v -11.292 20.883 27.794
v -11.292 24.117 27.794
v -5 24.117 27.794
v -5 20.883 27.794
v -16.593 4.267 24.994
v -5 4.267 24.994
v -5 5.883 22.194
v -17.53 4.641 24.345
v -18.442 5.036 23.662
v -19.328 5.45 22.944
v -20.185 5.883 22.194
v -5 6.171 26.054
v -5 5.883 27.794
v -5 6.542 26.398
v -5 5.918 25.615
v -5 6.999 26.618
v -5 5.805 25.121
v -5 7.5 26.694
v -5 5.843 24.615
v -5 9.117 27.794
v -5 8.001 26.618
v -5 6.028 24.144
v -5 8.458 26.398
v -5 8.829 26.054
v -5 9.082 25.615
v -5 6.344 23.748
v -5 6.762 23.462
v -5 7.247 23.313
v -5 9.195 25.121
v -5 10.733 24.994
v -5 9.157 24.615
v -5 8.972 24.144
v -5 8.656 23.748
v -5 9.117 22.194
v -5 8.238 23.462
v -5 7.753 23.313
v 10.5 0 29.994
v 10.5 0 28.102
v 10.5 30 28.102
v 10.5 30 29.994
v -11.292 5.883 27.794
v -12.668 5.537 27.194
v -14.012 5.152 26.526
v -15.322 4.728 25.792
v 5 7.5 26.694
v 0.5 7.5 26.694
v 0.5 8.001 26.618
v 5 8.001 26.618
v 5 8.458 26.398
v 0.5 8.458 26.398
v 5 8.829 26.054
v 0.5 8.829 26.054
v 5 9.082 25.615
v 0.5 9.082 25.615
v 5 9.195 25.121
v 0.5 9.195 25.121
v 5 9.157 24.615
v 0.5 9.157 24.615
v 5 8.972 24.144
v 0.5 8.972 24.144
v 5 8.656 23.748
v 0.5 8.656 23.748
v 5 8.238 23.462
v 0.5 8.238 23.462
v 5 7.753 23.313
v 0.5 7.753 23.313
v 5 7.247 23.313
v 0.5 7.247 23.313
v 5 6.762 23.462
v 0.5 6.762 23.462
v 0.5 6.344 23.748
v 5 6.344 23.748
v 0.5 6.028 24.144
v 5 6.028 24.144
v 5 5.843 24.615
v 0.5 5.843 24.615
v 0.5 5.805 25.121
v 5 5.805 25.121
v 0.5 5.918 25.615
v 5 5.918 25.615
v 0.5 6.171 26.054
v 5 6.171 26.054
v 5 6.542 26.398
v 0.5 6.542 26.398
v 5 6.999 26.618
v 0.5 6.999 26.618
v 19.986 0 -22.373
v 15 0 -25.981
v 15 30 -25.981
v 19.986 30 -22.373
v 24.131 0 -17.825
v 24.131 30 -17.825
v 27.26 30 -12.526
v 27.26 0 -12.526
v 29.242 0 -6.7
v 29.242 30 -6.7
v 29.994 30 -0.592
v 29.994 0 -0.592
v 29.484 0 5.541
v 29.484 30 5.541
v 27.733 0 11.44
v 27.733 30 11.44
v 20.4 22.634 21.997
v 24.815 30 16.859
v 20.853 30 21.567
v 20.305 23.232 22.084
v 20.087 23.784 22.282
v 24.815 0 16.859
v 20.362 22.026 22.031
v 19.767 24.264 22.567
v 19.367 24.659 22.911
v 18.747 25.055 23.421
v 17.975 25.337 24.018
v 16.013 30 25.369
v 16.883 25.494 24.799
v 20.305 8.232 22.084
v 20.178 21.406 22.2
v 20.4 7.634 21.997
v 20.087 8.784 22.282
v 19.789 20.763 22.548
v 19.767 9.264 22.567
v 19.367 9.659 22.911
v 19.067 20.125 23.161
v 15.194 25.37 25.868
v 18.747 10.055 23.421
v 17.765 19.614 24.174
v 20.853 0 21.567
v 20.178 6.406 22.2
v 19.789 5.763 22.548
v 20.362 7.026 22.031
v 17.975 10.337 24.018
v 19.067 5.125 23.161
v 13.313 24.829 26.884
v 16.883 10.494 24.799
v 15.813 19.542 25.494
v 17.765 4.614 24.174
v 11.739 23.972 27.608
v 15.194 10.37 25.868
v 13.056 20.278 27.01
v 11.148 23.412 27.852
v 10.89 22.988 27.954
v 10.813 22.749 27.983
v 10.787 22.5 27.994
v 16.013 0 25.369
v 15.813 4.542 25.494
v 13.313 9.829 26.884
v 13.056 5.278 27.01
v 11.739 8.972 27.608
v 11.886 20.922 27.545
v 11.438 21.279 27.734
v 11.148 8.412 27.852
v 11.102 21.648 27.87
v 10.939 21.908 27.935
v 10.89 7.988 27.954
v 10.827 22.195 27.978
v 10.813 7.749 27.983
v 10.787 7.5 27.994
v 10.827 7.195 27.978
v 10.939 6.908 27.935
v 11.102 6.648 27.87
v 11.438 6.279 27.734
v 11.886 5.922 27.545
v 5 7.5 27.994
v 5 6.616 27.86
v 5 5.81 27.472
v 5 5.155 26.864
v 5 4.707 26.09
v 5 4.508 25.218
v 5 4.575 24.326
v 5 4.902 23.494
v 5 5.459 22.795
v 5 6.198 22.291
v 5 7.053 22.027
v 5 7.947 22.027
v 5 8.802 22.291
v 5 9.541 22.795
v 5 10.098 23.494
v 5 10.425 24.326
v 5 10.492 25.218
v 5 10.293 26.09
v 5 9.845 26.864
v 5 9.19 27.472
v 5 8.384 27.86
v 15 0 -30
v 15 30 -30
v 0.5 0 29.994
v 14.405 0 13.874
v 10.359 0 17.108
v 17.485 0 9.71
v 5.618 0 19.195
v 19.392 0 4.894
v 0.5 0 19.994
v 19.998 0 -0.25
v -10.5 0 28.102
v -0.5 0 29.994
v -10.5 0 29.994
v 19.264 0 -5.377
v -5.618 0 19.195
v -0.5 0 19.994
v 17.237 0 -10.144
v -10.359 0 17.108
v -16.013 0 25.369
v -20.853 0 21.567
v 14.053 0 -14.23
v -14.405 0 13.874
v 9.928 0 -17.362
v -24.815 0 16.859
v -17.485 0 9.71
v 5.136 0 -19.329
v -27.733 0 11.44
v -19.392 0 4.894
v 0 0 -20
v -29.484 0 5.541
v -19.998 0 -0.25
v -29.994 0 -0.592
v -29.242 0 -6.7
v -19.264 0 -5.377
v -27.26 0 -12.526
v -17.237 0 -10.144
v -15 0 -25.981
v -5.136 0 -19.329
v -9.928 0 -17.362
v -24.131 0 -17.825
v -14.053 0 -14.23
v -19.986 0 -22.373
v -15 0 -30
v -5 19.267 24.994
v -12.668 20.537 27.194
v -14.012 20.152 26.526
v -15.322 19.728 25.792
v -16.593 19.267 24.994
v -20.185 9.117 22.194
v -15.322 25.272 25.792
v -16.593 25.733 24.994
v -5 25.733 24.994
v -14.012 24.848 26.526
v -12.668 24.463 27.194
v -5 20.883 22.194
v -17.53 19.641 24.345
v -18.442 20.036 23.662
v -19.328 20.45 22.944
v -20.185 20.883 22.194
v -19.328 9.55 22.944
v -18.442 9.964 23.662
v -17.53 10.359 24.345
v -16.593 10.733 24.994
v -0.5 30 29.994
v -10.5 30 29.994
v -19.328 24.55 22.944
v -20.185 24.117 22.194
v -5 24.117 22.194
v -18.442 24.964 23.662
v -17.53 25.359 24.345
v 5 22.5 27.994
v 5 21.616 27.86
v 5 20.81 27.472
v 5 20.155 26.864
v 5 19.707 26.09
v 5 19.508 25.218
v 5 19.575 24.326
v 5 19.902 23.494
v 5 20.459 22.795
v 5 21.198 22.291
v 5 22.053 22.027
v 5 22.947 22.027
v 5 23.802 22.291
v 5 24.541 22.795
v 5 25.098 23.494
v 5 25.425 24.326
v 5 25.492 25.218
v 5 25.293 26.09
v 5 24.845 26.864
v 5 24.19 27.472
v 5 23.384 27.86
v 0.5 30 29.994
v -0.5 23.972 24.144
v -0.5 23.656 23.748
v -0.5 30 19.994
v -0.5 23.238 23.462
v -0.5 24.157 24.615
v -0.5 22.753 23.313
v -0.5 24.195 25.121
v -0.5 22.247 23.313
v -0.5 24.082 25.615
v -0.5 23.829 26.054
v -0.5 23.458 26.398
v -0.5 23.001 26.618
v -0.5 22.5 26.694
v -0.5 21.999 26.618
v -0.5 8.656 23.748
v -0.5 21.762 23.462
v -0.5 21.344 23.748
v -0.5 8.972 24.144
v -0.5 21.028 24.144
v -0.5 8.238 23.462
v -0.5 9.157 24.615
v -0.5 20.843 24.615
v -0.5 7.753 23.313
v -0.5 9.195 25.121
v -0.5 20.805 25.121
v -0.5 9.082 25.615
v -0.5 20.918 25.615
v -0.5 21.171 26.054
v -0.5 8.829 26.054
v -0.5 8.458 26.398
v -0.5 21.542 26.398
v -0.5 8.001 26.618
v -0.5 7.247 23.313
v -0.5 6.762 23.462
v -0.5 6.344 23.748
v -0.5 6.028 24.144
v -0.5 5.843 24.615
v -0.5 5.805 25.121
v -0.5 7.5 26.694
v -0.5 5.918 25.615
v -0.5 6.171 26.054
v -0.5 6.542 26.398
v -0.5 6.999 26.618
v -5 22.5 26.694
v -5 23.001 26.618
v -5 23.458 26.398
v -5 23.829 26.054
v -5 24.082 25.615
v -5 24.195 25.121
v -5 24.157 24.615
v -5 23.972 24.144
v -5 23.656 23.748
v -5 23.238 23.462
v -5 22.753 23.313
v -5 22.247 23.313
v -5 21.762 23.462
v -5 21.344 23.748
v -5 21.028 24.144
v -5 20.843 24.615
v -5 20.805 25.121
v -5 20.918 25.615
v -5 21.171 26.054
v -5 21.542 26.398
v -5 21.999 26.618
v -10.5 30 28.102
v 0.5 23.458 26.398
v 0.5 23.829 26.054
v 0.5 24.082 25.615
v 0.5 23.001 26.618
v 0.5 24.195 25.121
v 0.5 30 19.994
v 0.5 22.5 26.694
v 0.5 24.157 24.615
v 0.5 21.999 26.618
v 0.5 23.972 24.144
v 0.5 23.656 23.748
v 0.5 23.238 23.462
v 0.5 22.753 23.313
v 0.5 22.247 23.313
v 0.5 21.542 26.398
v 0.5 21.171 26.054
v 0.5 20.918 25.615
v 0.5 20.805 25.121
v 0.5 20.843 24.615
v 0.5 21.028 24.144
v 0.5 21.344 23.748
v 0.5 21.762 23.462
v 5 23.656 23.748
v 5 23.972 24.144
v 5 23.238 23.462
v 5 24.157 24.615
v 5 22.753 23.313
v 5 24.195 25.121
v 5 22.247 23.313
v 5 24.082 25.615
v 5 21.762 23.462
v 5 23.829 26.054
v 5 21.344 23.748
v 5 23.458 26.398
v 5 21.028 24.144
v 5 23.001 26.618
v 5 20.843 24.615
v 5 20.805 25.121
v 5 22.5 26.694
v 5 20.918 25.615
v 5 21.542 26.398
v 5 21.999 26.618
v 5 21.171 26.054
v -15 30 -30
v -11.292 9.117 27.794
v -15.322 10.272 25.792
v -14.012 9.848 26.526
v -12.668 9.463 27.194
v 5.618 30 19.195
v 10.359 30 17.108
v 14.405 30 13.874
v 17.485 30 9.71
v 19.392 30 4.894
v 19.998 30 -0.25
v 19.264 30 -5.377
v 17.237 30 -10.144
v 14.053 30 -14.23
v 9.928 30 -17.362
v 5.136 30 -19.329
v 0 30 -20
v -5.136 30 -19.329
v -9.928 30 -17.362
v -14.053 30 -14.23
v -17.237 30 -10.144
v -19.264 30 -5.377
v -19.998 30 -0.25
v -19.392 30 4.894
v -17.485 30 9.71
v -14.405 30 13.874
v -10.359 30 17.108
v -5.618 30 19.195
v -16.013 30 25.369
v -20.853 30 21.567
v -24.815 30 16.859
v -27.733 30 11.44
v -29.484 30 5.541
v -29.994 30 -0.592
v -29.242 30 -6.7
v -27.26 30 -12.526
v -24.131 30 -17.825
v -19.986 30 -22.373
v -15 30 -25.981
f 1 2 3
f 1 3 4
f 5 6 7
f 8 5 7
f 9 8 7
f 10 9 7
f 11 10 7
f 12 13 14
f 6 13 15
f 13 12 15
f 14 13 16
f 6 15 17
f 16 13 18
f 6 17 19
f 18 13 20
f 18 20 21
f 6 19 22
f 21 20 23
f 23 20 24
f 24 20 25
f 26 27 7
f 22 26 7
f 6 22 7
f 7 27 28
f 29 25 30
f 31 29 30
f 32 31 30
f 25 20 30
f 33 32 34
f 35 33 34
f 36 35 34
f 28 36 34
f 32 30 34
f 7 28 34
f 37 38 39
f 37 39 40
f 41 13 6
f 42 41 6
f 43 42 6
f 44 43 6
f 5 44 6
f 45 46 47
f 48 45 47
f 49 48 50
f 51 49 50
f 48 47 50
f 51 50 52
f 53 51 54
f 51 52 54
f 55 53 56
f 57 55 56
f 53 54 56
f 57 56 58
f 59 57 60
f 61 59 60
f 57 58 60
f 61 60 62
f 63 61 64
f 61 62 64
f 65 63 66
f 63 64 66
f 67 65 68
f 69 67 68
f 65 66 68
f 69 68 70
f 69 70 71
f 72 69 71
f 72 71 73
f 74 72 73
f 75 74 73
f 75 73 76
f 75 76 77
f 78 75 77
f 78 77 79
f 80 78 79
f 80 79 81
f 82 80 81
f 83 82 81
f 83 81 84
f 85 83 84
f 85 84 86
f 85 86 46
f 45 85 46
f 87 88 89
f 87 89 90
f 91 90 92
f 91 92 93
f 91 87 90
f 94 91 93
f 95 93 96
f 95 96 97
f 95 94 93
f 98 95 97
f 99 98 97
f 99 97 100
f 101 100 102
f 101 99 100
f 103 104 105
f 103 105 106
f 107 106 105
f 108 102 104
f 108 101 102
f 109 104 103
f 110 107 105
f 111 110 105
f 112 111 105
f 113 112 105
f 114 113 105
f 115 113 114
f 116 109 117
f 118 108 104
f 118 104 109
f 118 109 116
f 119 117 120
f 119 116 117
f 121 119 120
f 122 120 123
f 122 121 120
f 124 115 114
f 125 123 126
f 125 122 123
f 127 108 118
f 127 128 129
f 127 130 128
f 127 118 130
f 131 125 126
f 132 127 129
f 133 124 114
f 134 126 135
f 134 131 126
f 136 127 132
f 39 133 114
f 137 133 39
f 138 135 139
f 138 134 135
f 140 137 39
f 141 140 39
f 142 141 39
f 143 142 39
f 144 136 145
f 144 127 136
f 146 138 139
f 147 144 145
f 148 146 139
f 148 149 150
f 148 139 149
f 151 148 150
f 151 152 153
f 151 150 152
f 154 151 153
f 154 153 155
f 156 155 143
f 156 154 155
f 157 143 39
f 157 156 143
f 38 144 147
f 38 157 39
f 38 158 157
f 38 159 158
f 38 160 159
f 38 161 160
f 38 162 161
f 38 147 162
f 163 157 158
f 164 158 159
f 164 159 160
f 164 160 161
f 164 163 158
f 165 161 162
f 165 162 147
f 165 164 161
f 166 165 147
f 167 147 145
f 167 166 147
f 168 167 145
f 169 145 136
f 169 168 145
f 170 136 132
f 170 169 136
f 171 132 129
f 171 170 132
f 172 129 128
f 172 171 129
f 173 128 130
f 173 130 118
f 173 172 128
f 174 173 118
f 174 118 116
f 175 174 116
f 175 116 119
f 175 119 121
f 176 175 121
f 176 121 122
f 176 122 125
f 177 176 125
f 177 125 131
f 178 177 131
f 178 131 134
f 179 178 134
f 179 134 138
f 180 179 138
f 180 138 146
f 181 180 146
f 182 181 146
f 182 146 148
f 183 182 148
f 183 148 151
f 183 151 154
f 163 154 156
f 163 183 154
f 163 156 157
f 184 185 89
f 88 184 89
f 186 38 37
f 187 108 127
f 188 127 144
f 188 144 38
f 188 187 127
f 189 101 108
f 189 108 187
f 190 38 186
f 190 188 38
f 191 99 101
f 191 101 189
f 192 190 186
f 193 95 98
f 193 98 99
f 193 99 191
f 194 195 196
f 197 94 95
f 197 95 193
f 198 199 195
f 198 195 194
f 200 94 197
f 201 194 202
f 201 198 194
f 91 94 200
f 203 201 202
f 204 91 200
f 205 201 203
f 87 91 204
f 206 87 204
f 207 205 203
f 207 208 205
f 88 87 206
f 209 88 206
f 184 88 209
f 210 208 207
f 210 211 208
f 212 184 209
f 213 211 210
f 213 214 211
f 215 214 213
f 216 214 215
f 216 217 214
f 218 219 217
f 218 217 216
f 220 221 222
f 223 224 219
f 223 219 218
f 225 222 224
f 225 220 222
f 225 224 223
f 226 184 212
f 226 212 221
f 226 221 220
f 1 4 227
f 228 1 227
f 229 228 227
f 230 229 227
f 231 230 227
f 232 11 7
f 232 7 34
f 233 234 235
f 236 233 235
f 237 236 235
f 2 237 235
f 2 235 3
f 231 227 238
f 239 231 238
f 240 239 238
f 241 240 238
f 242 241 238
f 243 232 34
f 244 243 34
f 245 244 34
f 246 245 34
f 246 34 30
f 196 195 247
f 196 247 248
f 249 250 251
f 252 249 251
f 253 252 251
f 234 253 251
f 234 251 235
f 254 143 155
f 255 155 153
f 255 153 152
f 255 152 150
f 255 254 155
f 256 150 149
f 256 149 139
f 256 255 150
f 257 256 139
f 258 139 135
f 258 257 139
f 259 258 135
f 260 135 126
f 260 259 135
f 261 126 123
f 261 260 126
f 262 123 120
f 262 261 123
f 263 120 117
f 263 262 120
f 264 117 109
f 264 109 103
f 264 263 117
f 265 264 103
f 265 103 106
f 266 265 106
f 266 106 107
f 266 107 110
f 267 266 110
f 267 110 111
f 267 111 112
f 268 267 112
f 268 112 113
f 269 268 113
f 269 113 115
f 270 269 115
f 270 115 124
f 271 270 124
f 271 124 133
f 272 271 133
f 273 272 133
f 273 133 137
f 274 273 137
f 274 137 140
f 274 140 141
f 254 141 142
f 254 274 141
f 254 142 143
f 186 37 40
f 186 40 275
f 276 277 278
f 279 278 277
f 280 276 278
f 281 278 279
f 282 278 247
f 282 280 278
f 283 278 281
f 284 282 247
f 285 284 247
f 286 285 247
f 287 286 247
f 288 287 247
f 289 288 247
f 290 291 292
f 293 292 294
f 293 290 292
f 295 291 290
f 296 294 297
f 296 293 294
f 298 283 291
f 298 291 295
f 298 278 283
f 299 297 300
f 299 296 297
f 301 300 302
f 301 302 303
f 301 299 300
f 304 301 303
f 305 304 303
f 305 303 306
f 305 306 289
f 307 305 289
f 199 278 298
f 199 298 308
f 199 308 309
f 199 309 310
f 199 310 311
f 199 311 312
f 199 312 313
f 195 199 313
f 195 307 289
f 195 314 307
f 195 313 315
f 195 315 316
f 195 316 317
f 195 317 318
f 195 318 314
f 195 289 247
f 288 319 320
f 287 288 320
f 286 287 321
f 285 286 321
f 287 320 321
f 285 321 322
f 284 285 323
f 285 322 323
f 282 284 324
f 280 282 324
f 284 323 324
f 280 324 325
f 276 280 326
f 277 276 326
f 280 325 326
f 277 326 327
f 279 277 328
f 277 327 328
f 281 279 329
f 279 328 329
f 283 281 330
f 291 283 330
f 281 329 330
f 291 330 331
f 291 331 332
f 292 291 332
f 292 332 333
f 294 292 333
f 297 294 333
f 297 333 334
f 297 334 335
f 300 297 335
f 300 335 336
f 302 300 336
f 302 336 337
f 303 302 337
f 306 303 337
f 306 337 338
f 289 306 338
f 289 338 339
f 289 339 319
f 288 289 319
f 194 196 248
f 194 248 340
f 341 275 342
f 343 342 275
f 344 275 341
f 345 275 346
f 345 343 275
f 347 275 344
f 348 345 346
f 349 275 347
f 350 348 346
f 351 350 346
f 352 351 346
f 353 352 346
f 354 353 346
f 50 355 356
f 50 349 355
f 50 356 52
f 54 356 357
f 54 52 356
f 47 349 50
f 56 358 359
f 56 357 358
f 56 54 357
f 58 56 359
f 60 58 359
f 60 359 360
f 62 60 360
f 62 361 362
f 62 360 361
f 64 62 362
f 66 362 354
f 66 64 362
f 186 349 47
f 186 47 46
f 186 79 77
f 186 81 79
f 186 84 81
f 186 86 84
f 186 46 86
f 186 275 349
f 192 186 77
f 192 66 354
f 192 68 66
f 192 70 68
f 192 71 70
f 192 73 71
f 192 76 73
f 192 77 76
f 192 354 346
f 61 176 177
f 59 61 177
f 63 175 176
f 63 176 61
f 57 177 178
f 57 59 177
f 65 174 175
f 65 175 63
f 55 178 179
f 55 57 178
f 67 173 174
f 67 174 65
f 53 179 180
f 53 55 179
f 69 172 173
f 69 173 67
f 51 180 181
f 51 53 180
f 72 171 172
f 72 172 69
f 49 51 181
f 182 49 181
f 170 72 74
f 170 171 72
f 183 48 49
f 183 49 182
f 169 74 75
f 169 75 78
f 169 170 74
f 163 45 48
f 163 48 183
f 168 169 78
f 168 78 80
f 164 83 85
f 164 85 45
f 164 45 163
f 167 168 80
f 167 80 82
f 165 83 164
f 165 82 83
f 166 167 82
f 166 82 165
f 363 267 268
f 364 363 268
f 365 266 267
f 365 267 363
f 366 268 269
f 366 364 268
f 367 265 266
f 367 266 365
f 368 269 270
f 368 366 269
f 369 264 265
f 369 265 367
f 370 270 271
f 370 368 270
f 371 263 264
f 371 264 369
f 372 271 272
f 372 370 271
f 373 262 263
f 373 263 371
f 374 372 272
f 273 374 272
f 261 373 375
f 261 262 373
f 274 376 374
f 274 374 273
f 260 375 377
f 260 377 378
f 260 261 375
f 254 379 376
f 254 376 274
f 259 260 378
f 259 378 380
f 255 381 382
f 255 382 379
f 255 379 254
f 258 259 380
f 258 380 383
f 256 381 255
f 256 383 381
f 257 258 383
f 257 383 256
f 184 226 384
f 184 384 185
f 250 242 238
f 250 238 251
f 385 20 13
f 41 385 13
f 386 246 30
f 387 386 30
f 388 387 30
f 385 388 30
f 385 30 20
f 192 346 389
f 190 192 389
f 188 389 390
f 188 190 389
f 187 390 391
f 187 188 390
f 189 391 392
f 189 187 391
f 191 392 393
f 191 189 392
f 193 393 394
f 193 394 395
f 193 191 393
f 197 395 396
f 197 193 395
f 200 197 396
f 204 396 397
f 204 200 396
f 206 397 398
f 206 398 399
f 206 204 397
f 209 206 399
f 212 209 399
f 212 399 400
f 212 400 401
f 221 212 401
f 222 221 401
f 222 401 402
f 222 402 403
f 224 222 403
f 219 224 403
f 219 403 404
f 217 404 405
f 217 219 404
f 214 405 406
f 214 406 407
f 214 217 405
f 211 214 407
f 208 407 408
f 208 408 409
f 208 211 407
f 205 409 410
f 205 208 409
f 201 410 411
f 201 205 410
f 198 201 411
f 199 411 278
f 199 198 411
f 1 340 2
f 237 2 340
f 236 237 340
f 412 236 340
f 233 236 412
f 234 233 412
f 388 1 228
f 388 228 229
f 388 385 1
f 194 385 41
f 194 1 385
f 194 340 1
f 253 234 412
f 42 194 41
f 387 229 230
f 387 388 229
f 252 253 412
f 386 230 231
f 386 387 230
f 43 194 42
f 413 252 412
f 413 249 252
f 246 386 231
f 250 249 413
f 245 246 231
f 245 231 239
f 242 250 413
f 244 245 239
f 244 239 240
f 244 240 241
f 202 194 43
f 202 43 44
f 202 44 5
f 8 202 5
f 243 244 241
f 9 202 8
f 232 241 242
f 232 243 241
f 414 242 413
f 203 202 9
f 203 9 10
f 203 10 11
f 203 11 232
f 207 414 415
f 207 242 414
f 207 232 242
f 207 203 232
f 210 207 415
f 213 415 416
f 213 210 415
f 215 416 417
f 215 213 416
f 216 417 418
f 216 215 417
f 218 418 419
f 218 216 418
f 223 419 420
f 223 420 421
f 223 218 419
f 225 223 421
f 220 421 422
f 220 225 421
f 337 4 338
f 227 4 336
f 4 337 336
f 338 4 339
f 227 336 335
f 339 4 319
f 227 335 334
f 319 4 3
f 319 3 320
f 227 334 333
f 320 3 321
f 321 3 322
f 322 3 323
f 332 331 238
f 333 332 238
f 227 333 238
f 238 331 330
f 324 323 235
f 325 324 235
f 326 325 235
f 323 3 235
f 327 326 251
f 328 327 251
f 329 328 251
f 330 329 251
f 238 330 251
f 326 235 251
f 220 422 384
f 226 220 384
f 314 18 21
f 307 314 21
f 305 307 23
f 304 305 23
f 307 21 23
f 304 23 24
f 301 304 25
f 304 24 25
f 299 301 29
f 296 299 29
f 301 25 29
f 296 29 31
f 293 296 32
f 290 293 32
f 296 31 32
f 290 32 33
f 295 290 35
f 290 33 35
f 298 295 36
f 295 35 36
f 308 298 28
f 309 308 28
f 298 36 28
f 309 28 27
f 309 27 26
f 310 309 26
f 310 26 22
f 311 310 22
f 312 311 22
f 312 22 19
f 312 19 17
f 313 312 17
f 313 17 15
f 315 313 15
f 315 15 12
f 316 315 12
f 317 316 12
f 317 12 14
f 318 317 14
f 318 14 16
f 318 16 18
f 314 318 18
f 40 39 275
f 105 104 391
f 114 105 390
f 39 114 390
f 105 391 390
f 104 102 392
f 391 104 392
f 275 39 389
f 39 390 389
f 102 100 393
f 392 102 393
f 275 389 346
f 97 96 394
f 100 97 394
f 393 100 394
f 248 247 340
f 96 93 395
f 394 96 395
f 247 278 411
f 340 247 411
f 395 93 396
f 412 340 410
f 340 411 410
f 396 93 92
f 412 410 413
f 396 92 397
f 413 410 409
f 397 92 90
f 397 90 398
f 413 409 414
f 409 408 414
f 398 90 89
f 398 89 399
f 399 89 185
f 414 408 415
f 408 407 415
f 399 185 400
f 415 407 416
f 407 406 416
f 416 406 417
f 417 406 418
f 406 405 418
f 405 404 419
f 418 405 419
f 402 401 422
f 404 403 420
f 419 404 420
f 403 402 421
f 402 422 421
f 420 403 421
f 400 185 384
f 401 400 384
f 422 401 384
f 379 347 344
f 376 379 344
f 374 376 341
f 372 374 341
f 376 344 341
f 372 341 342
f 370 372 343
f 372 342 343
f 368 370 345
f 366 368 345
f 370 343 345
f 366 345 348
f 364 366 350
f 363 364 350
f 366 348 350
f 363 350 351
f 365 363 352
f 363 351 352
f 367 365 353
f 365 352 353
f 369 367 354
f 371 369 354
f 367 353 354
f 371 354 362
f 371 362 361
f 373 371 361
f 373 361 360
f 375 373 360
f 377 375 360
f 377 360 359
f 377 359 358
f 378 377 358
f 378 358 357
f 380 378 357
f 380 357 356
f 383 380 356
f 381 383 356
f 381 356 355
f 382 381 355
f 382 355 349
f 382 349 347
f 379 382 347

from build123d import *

# Parameters (mm, degrees)
BOSS_EXTRUDE1_DEPTH     = 30
CUT_EXTRUDE1_REACH      = 57
CUT_EXTRUDE1_END_RADIUS = 30
SKETCH7_R               = 3
CUT_EXTRUDE2_REACH      = 57
CUT_EXTRUDE2_END_RADIUS = 30
M3_CLEARANCE_HOLE1_D    = 3.4


with BuildPart() as part:
    # Sketch1 → Boss-Extrude1 (new body)
    with BuildSketch(Plane(origin=(0, 0, 0), x_dir=(1, 0, 0), z_dir=(0, 1, 0))):
        with BuildLine():
            Line((-0.5, -19.993749023), (-0.5, -29.993749023))
            Line((-0.5, -29.993749023), (-10.5, -29.993749023))
            Line((-10.5, -29.993749023), (-10.5, -28.102490993))
            ThreePointArc((-10.5, -28.102490993), (-29.896689894, -2.4875557), (-15, 25.980762114))
            Line((-15, 25.980762114), (-15, 30))
            Line((-15, 30), (15, 30))
            Line((15, 30), (15, 25.980762114))
            ThreePointArc((15, 25.980762114), (29.896689894, -2.4875557), (10.5, -28.102490993))
            Line((10.5, -28.102490993), (10.5, -29.993749023))
            Line((10.5, -29.993749023), (0.5, -29.993749023))
            Line((0.5, -29.993749023), (0.5, -19.993749023))
            ThreePointArc((0.5, -19.993749023), (0, 20), (-0.5, -19.993749023))
        make_face()
    extrude(amount=BOSS_EXTRUDE1_DEPTH)

    # Cut-Extrude1: up to this cylinder (the profile starts inside it)
    cut_extrude1_end = Plane(origin=(0, 15, 0), z_dir=(0, -1, 0)) * Cylinder(CUT_EXTRUDE1_END_RADIUS, 190, mode=Mode.PRIVATE)
    # Sketch7 → Cut-Extrude1 (cut, up to the surface)
    with BuildSketch(Plane(origin=(5, 0, 0), x_dir=(0, 0, -1), z_dir=(1, 0, 0)), mode=Mode.PRIVATE) as cut_extrude1_sk1:
        with Locations(Location((-24.993749023, 22.5, 0), (0, 0, 180))):
            Circle(SKETCH7_R)
    cut_extrude1_tool1 = extrude(cut_extrude1_sk1.sketch, amount=CUT_EXTRUDE1_REACH, mode=Mode.PRIVATE) & cut_extrude1_end
    add(cut_extrude1_tool1.solids().sort_by_distance((5, 22.5, 24.993749))[0], mode=Mode.SUBTRACT)
    # Sketch7 → Cut-Extrude1 (cut, up to the surface)
    with BuildSketch(Plane(origin=(5, 0, 0), x_dir=(0, 0, -1), z_dir=(1, 0, 0)), mode=Mode.PRIVATE) as cut_extrude1_sk2:
        with Locations(Location((-24.993749023, 7.5, 0), (0, 0, 180))):
            Circle(SKETCH7_R)
    cut_extrude1_tool2 = extrude(cut_extrude1_sk2.sketch, amount=CUT_EXTRUDE1_REACH, mode=Mode.PRIVATE) & cut_extrude1_end
    add(cut_extrude1_tool2.solids().sort_by_distance((5, 7.5, 24.993749))[0], mode=Mode.SUBTRACT)

    # Cut-Extrude2: up to this cylinder (the profile starts inside it)
    cut_extrude2_end = Plane(origin=(0, 15, 0), z_dir=(0, -1, 0)) * Cylinder(CUT_EXTRUDE2_END_RADIUS, 190, mode=Mode.PRIVATE)
    # Sketch8 → Cut-Extrude2 (cut, up to the surface)
    with BuildSketch(Plane(origin=(-5, 0, 0), x_dir=(0, 0, -1), z_dir=(1, 0, 0)), mode=Mode.PRIVATE) as cut_extrude2_sk1:
        Polygon((-24.993749023, 19.266838493), (-22.193749023, 20.883419246), (-22.193749023, 24.116580754), (-24.993749023, 25.733161507), (-27.793749023, 24.116580754), (-27.793749023, 20.883419246), align=None)
    cut_extrude2_tool1 = extrude(cut_extrude2_sk1.sketch, amount=-CUT_EXTRUDE2_REACH, mode=Mode.PRIVATE) & cut_extrude2_end
    add(cut_extrude2_tool1.solids().sort_by_distance((-5, 22.5, 24.993749))[0], mode=Mode.SUBTRACT)
    # Sketch8 → Cut-Extrude2 (cut, up to the surface)
    with BuildSketch(Plane(origin=(-5, 0, 0), x_dir=(0, 0, -1), z_dir=(1, 0, 0)), mode=Mode.PRIVATE) as cut_extrude2_sk2:
        Polygon((-24.993749023, 4.266838493), (-22.193749023, 5.883419246), (-22.193749023, 9.116580754), (-24.993749023, 10.733161507), (-27.793749023, 9.116580754), (-27.793749023, 5.883419246), align=None)
    cut_extrude2_tool2 = extrude(cut_extrude2_sk2.sketch, amount=-CUT_EXTRUDE2_REACH, mode=Mode.PRIVATE) & cut_extrude2_end
    add(cut_extrude2_tool2.solids().sort_by_distance((-5, 7.5, 24.993749))[0], mode=Mode.SUBTRACT)

    # M3 Clearance Hole1 (through all)
    with Locations(Plane(origin=(5, 0, 0), x_dir=(0, 0, -1), z_dir=(1, 0, 0))):
        with Locations((-24.993749023, 7.5), (-24.993749023, 22.5)):
            Hole(M3_CLEARANCE_HOLE1_D / 2)


solid = part.part
